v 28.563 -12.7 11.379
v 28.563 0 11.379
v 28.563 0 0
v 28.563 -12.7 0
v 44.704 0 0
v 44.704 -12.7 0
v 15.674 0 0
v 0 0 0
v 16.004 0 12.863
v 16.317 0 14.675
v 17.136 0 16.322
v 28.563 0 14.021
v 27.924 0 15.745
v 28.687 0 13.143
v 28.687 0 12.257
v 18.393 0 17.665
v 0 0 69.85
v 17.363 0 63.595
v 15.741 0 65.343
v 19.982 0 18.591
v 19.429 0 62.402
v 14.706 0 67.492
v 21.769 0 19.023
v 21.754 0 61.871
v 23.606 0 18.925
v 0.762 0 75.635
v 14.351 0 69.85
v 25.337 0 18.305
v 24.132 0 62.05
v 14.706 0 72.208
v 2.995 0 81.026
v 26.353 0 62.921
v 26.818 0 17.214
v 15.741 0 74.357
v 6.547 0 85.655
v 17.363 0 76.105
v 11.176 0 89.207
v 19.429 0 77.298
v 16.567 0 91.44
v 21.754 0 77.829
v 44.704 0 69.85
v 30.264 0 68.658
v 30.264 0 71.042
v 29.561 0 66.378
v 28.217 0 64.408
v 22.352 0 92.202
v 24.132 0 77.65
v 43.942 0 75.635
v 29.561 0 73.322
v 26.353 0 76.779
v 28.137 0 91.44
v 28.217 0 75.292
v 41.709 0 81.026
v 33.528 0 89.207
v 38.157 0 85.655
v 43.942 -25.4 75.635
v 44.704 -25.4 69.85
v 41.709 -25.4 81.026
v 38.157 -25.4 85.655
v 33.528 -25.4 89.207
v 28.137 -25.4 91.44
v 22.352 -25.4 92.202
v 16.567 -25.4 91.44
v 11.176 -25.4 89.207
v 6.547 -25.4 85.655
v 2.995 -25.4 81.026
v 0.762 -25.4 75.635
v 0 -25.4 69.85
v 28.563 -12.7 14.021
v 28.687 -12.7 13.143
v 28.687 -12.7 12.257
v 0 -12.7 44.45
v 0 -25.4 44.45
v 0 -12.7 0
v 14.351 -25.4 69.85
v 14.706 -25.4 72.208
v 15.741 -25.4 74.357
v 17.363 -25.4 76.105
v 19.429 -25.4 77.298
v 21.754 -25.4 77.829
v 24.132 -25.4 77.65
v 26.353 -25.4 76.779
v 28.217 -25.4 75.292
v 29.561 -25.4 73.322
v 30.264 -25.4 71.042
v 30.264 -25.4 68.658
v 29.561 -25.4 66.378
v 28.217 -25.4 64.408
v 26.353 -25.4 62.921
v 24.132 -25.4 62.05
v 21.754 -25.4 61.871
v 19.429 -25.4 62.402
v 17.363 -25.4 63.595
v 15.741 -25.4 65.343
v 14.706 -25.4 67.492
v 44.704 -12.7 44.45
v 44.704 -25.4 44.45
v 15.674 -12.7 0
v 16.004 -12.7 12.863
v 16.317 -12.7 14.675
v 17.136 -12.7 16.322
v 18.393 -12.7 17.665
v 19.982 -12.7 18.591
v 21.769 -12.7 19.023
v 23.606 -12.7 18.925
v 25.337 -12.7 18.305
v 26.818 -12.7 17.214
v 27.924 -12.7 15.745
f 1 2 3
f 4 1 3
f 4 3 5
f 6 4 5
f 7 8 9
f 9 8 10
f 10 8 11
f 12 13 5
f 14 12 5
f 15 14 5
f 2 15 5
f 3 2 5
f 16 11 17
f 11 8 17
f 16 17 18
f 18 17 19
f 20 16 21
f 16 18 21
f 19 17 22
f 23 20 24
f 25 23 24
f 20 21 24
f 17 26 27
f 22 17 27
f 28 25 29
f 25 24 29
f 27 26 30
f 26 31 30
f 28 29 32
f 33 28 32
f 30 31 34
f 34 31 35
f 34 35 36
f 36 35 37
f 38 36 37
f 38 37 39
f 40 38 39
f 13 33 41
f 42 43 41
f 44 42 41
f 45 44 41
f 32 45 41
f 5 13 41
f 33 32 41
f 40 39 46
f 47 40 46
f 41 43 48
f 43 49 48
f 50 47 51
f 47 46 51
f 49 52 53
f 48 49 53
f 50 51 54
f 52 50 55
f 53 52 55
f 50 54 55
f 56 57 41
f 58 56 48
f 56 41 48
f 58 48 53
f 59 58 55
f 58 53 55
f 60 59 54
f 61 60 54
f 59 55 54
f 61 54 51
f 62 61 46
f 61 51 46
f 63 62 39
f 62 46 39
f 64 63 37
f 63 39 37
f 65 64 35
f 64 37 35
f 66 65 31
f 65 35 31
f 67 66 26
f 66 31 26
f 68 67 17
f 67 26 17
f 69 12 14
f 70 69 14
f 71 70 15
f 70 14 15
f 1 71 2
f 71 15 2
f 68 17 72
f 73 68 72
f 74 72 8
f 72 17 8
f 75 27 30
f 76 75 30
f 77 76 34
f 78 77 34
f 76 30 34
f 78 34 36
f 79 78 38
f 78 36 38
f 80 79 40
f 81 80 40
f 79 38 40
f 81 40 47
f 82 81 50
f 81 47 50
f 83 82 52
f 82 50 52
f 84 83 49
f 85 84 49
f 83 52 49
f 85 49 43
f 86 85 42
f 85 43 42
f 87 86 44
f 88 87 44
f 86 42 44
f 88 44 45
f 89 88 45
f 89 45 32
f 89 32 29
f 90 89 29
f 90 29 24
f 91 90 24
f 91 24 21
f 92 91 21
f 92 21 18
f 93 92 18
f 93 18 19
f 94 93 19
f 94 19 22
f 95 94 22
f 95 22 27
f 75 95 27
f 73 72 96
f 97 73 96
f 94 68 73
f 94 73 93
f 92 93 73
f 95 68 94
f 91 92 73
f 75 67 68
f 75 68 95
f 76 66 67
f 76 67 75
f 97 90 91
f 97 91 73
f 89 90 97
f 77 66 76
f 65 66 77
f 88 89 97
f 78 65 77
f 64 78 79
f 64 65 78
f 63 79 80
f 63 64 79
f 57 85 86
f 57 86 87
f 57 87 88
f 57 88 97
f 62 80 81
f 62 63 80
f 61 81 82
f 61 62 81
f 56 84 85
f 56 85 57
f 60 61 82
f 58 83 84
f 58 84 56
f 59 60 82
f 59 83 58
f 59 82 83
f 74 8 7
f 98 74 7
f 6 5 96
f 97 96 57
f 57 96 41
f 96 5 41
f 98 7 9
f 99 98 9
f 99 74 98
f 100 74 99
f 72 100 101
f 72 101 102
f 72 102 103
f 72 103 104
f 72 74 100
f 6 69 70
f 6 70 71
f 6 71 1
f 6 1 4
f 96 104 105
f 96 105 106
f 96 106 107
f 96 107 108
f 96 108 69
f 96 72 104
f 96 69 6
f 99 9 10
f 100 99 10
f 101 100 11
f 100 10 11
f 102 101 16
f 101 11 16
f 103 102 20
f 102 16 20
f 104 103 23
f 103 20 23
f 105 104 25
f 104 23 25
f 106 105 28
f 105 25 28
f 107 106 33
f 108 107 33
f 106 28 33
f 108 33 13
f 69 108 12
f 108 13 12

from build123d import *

# Parameters (mm, degrees)
F1_DEPTH = 12.7
F3_DEPTH = 12.7
F5_D     = 16.002


with BuildPart() as f1:
    # F0 (on Front) → F1 (new body)
    with BuildSketch(Plane.XZ):
        with BuildLine():
            Line((0, 69.85), (0, 0))
            Line((0, 0), (15.67386, 0))
            Line((15.67386, 0), (16.004092, 12.86297))
            ThreePointArc((16.004092, 12.86297), (21.769188, 19.023198), (28.563172, 14.020547))
            ThreePointArc((28.563172, 14.020547), (28.702, 12.7), (28.563172, 11.379453))
            Line((28.563172, 11.379453), (28.563172, 0))
            Line((28.563172, 0), (44.704, 0))
            Line((44.704, 0), (44.704, 69.85))
            ThreePointArc((44.704, 69.85), (22.352, 92.202), (0, 69.85))
        make_face()
    extrude(amount=F1_DEPTH)

    # F2 (on face) → F3 (join)
    with BuildSketch(Plane.XZ.offset(12.7)):
        with BuildLine():
            Line((0, 69.85), (0, 44.45))
            Line((0, 44.45), (2.100821, 44.45))
            Line((2.100821, 44.45), (44.704, 44.45))
            Line((44.704, 44.45), (44.704, 69.85))
            ThreePointArc((44.704, 69.85), (22.352, 92.202), (0, 69.85))
        make_face()
    extrude(amount=F3_DEPTH)

    # F5 (through all)
    with Locations(Plane.XZ.offset(25.4)):
        with Locations((22.352, 69.85)):
            Hole(F5_D / 2)


solid = f1.part
